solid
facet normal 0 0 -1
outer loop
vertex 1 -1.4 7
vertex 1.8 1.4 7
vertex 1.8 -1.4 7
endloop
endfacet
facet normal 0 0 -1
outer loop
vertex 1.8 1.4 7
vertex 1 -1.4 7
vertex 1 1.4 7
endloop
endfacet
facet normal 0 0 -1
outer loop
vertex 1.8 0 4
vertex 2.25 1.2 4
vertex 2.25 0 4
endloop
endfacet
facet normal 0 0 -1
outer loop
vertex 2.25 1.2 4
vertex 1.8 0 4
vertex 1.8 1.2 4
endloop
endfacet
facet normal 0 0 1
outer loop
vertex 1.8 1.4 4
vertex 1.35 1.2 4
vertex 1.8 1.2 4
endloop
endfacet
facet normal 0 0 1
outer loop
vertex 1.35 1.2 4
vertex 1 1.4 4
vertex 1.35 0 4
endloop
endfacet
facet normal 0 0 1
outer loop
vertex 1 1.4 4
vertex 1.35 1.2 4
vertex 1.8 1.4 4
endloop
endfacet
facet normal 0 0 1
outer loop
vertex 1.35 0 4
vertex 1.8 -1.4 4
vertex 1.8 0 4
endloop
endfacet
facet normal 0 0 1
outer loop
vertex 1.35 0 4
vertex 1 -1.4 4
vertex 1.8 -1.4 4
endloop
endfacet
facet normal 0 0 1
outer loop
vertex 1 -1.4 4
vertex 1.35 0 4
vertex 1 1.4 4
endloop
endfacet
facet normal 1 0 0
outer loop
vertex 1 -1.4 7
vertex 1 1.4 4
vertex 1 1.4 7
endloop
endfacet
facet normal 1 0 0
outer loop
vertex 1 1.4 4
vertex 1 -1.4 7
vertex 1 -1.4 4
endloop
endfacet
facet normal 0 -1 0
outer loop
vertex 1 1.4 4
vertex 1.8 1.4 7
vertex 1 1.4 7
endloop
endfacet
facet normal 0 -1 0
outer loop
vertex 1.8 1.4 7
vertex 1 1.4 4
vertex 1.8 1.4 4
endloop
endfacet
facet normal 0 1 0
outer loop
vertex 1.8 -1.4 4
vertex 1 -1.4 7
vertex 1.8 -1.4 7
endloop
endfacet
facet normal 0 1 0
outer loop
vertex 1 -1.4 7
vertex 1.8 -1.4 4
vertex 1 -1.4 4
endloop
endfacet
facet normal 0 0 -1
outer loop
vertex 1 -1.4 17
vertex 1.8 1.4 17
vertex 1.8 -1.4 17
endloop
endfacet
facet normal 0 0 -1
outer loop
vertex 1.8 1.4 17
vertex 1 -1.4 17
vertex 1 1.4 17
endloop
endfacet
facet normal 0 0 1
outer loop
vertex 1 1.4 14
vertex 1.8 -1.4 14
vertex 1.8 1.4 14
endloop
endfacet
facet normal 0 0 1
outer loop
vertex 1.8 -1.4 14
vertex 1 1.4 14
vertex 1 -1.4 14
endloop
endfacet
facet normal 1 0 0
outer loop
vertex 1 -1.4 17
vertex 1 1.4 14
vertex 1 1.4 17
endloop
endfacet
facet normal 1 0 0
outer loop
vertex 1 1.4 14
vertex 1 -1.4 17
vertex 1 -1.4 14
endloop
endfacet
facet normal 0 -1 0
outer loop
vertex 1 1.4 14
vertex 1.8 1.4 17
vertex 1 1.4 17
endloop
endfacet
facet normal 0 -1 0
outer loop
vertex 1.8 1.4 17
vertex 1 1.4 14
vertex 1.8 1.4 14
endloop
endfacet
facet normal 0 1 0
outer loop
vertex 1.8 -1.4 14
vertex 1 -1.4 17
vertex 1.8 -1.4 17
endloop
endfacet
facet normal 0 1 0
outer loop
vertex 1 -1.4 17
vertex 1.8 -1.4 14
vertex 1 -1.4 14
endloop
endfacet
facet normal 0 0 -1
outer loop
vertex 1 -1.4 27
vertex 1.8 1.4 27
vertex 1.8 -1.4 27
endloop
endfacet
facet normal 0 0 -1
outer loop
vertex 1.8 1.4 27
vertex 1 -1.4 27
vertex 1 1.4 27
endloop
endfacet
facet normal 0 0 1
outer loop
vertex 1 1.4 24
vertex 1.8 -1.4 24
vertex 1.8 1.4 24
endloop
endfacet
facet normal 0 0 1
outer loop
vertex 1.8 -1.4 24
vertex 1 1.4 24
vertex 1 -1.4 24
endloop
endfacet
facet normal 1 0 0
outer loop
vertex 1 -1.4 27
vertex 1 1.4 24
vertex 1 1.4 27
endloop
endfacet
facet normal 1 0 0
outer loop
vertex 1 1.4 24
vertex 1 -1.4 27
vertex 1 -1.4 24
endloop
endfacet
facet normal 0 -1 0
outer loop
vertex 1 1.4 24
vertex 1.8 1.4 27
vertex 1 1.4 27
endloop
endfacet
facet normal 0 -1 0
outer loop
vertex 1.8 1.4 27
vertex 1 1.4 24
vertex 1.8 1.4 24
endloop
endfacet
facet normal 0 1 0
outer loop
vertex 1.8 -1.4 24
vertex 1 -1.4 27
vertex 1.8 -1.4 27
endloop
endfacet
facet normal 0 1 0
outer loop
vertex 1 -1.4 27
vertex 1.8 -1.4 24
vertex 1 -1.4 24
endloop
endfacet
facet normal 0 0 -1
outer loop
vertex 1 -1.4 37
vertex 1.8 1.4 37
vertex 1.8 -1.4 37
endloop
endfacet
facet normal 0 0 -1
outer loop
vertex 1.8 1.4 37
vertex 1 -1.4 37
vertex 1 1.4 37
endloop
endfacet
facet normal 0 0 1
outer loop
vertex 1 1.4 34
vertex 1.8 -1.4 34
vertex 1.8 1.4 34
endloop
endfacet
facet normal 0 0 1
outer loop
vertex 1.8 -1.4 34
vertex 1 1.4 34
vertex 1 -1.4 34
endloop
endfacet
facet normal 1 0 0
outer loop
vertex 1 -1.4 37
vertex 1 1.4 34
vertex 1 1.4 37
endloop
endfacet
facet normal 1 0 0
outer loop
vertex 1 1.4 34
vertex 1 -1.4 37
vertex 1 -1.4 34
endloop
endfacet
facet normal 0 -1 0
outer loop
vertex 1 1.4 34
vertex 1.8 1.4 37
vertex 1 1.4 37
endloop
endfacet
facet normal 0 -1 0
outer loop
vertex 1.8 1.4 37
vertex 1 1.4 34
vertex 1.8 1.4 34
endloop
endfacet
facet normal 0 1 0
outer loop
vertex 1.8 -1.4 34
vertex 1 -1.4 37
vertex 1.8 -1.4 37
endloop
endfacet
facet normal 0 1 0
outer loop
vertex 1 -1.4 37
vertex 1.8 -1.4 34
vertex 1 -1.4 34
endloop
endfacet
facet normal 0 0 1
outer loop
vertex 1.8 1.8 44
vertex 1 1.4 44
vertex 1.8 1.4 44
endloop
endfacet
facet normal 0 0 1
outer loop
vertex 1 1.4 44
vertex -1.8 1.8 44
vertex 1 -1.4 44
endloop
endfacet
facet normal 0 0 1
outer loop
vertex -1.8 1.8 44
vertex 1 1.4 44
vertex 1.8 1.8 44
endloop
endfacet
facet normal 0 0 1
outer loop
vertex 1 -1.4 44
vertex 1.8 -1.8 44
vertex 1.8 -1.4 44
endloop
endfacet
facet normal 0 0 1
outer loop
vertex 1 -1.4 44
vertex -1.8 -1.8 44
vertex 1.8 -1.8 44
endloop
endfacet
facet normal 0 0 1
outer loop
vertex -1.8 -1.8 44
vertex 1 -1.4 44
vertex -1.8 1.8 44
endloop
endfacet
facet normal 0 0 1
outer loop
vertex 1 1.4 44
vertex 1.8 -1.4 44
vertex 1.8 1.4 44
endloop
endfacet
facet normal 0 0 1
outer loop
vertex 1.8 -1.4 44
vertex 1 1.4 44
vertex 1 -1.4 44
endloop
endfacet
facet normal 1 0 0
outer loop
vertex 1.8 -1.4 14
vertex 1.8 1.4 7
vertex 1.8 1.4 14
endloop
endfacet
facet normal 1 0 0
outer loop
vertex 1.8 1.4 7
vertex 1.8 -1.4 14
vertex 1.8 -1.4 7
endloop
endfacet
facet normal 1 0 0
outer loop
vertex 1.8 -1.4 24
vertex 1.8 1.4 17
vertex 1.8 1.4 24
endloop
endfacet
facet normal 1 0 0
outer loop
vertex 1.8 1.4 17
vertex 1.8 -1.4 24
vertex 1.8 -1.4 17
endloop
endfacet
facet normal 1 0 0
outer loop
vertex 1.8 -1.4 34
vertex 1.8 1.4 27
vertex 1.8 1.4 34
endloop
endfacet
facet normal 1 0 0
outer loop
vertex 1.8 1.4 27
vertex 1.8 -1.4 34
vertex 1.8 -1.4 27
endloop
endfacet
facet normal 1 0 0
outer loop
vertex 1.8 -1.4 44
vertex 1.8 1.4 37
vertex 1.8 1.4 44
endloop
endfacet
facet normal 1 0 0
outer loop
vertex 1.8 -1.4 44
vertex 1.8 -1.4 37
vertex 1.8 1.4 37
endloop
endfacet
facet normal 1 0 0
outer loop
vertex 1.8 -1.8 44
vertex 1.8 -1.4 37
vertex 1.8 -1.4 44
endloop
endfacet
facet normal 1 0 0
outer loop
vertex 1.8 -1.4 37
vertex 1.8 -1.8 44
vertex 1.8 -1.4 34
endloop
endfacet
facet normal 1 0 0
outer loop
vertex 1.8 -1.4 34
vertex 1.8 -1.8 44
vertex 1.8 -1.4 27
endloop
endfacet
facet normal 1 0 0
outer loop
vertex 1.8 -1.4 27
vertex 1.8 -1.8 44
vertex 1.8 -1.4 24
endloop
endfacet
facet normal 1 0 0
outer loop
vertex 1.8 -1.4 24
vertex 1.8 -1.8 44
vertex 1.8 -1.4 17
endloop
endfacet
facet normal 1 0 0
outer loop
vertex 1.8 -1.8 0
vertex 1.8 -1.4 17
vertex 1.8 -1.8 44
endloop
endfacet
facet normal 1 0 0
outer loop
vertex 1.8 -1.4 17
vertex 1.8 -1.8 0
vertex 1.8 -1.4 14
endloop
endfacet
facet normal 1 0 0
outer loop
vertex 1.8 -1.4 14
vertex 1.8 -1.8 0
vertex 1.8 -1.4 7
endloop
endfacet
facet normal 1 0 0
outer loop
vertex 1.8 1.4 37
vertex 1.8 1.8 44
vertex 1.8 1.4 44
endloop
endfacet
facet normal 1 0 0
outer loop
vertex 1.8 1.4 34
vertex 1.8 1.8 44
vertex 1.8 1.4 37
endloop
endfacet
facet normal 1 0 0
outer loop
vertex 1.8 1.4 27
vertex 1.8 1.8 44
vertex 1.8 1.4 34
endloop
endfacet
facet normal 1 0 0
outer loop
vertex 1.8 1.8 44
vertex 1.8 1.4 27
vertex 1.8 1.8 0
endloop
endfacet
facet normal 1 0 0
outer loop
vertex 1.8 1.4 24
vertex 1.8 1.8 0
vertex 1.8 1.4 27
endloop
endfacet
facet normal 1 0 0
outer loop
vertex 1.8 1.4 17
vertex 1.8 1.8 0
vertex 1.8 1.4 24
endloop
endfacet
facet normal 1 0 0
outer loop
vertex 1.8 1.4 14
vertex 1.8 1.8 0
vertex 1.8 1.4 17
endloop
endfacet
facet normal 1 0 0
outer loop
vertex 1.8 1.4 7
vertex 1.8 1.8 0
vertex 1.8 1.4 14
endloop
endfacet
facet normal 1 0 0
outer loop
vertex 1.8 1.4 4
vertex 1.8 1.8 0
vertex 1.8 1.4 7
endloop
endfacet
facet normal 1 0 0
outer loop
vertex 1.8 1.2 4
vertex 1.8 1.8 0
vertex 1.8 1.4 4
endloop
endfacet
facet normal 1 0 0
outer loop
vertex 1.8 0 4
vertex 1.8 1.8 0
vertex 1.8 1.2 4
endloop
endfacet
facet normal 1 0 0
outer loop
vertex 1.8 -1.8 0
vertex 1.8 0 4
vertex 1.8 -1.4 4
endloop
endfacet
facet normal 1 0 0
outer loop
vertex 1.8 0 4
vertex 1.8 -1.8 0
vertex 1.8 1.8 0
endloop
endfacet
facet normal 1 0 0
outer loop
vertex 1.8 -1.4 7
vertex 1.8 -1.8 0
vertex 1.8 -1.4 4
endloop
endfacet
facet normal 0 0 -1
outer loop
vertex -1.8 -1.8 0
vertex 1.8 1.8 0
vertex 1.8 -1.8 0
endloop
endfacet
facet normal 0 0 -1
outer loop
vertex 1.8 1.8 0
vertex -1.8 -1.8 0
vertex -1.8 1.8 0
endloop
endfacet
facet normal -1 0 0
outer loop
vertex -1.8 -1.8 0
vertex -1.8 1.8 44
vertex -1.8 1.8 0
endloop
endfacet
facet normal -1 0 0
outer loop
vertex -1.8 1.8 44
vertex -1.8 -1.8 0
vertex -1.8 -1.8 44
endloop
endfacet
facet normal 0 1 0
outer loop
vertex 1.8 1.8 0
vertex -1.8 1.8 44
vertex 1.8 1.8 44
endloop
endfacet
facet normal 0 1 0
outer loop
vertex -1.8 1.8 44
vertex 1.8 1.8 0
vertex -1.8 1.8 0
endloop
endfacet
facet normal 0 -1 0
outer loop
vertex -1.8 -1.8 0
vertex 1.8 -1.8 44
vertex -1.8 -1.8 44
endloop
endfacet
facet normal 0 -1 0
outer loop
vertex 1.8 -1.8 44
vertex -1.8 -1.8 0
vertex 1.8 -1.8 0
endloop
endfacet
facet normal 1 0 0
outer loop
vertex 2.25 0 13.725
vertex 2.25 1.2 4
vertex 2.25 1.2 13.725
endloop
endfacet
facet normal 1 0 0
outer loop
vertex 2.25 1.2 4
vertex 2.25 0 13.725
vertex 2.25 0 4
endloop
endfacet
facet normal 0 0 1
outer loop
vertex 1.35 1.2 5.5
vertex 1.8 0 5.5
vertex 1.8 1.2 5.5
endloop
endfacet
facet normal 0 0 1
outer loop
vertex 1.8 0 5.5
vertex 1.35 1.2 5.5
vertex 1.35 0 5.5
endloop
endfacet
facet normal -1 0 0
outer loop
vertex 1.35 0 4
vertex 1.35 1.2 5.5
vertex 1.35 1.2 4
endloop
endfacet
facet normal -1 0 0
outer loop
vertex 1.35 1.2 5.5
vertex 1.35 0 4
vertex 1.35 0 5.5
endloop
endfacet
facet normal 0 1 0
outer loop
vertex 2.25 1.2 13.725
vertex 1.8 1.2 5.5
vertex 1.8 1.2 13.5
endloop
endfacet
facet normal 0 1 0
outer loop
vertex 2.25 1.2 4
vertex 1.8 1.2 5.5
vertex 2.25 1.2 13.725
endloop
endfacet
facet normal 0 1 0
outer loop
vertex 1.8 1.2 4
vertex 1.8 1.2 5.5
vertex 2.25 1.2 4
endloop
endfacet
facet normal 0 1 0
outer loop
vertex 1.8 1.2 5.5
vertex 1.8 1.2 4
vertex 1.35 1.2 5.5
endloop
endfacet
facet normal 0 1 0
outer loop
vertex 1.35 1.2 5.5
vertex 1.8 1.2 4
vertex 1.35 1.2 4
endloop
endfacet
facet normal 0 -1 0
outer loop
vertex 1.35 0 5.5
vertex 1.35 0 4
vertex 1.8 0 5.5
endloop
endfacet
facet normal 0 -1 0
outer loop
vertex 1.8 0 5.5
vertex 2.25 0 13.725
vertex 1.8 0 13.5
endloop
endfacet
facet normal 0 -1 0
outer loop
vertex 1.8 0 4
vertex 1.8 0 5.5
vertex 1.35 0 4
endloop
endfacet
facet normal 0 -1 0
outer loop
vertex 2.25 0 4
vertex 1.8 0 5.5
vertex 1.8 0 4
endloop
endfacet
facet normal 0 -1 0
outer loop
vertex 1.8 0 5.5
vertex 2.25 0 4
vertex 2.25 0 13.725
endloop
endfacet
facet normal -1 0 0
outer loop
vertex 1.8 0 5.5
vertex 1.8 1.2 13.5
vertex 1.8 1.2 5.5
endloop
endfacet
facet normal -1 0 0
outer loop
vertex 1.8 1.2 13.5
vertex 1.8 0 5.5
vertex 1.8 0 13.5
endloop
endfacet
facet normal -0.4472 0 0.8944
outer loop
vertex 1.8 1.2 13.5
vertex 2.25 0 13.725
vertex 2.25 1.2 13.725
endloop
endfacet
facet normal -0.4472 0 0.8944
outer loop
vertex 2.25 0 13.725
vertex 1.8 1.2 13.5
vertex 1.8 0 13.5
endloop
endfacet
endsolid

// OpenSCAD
// DND-71 S6-LC ultra-low-cost shape display -- real OpenSCAD geometry.
//
// EVIDENCE CLASS: CAD (geometry only). No print, no measurement (DND-27).
// All dimensions are mirrored from ../analysis/s6lc.py.
//
// Machine: 8 banks of 10 rows (80x80 = 6,400 cells) at 5.08 mm pitch.
//   * square printed columns with a 5-pocket vertical rack (10 mm pockets);
//   * printed cantilever pawls (0.90 x 1.20 x 8.00 mm) holding a column;
//   * per-bank threshold mask gate (printed sliding comb) read from a medium;
//   * 8 banked release combs on a travelling reset carriage;
//   * one 4-screw belt-synced platen (printed frame, excluded from the BOM).
//
// Render (real OpenSCAD):
//   openscad -o s6lc_cell.stl       -D 'PART="cell"'    s6lc_machine.scad
//   openscad -o s6lc_bank.stl       -D 'PART="bank"'    s6lc_machine.scad
//   openscad -o s6lc_platen.stl     -D 'PART="platen"'  s6lc_machine.scad

PART = "cell";

// ---- product / geometry constants (analysis/s6lc.py) ----------------------
PITCH       = 5.08;
BODY        = 3.60;      // square column body (S1 lane budget: 3.60 + 1.48 = 5.08)
COL_H       = 44.0;      // column height (40 mm travel + 4 mm base)
TRAVEL      = 40.0;
LEVEL       = 10.0;
POCKET_H    = 3.0;       // rack pocket depth in Z
POCKET_D    = 0.8;       // rack pocket depth in X (S1 coupon)
PAWL_T      = 0.90;      // 2 extrusion lines
PAWL_W      = 1.20;
PAWL_L      = 8.00;
ROWS_BANK   = 10;
COLS        = 80;
BANKS       = 8;

$fn = 48;

module column_with_rack() {
    // Square column body with 5 rack pockets on the +X face.
    difference() {
        translate([-BODY/2, -BODY/2, 0]) cube([BODY, BODY, COL_H]);
        // rack pockets at 0,10,20,30,40 mm above the base
        for (k = [0:4]) {
            translate([BODY/2 - POCKET_D, -BODY/2 + 0.4, 4 + k*LEVEL])
                cube([POCKET_D + 1, BODY - 0.8, POCKET_H]);
        }
    }
}

module pawl() {
    // Rooted cantilever: base block + thin leaf with a wedge toe.
    // DND-93/A1: the ROOT block is anchored OUTBOARD of the pitch band (in the
    // frame); only the thin LEAF (PAWL_T/2 = 0.45 mm) enters the owned 0.74 mm
    // lane. Root block at x=0, leaf set back so its outer face stays <= 0.74 mm
    // from the body edge.
    translate([0, 0, 0]) cube([PAWL_T, PAWL_W, 1.5]);          // root block (frame side)
    translate([PAWL_T - PAWL_T/2, 0, 1.5])
        cube([PAWL_T/2, PAWL_W, PAWL_L]);                       // thin leaf (enters lane)
    // toe wedge at the free end (points into the rack)
    translate([PAWL_T - PAWL_T/2, 0, 1.5 + PAWL_L - 1.2])
        multmatrix([[1,0,0,0],[0,1,0,0],[0.5,0,1,0],[0,0,0,1]])
            cube([PAWL_T/2, PAWL_W, 1.2]);
}

module mask_gate() {
    // Printed sliding comb: body bar + bosses over cells that must be BLOCKED.
    // One per bank (COLS = 80 cells wide); boss pitch = PITCH.
    bar_w = COLS * PITCH;
    translate([0, 0, 0]) cube([bar_w, 1.2, 1.0]);
    for (i = [0 : COLS-1]) {
        // alternating boss pattern is illustrative geometry; the real pattern
        // comes from the map. This renders the printable comb envelope.
        if (i % 2 == 0)
            translate([i*PITCH + PITCH/2 - 0.44, -0.4, 1.0])
                cube([0.88, 2.0, 1.2]);
    }
}

module release_comb() {
    // One bank release comb: a bar with a toe under every cell, lifted by the
    // travelling carriage to trip all pawls of the bank at reset.
    bar_w = COLS * PITCH;
    translate([0, 0, 0]) cube([bar_w, 1.2, 1.0]);
    for (i = [0 : COLS-1]) {
        translate([i*PITCH + PITCH/2 - 0.44, 0.8, 1.0])
            cube([0.88, 1.6, 1.0]);
    }
}

module bank_row() {
    // One row of a bank: 80 cells at true pitch, with pawl + gate lanes.
    for (i = [0 : COLS-1]) {
        translate([i*PITCH, 0, 0]) {
            column_with_rack();
        }
    }
    // pawl lane sits in the Y gap between rows (not rendered per cell here for
    // clarity of the row envelope; the cell module includes the pawl).
}

module cell_assembly() {
    // The unit-cell mechanism: column + pawl (side-by-side lane) + gate lane.
    // DND-93/A1: body edge at BODY/2 = 1.80 mm; owned lane runs to the half
    // pitch 2.54 mm. Place the pawl root so its LEAF outer face is at most the
    // half pitch: root origin x0 = BODY/2 + (OWNED_LANE - PAWL_T) so the root
    // block ends inside the lane and the leaf sits within it.
    column_with_rack();
    translate([BODY/2 - (PAWL_T - PAWL_T/2), 0, 4]) pawl();
}

module bank_assembly() {
    // A bank: the full 80-column width at true pitch, rendered as 3
    // representative rows to keep the mesh tractable (the envelope width
    // 80 * PITCH = 406.4 mm is the printability-relevant dimension; the row
    // count does not change any gate). The real bank is 10 rows, sub-tiled.
    for (r = [0 : 2]) {
        translate([0, r*PITCH, 0]) bank_row();
    }
}

if (PART == "cell")     cell_assembly();
if (PART == "bank")     bank_assembly();
if (PART == "gate")     mask_gate();
if (PART == "comb")     release_comb();
if (PART == "platen")   cube([COLS*PITCH, ROWS_BANK*PITCH, 2.0]);
